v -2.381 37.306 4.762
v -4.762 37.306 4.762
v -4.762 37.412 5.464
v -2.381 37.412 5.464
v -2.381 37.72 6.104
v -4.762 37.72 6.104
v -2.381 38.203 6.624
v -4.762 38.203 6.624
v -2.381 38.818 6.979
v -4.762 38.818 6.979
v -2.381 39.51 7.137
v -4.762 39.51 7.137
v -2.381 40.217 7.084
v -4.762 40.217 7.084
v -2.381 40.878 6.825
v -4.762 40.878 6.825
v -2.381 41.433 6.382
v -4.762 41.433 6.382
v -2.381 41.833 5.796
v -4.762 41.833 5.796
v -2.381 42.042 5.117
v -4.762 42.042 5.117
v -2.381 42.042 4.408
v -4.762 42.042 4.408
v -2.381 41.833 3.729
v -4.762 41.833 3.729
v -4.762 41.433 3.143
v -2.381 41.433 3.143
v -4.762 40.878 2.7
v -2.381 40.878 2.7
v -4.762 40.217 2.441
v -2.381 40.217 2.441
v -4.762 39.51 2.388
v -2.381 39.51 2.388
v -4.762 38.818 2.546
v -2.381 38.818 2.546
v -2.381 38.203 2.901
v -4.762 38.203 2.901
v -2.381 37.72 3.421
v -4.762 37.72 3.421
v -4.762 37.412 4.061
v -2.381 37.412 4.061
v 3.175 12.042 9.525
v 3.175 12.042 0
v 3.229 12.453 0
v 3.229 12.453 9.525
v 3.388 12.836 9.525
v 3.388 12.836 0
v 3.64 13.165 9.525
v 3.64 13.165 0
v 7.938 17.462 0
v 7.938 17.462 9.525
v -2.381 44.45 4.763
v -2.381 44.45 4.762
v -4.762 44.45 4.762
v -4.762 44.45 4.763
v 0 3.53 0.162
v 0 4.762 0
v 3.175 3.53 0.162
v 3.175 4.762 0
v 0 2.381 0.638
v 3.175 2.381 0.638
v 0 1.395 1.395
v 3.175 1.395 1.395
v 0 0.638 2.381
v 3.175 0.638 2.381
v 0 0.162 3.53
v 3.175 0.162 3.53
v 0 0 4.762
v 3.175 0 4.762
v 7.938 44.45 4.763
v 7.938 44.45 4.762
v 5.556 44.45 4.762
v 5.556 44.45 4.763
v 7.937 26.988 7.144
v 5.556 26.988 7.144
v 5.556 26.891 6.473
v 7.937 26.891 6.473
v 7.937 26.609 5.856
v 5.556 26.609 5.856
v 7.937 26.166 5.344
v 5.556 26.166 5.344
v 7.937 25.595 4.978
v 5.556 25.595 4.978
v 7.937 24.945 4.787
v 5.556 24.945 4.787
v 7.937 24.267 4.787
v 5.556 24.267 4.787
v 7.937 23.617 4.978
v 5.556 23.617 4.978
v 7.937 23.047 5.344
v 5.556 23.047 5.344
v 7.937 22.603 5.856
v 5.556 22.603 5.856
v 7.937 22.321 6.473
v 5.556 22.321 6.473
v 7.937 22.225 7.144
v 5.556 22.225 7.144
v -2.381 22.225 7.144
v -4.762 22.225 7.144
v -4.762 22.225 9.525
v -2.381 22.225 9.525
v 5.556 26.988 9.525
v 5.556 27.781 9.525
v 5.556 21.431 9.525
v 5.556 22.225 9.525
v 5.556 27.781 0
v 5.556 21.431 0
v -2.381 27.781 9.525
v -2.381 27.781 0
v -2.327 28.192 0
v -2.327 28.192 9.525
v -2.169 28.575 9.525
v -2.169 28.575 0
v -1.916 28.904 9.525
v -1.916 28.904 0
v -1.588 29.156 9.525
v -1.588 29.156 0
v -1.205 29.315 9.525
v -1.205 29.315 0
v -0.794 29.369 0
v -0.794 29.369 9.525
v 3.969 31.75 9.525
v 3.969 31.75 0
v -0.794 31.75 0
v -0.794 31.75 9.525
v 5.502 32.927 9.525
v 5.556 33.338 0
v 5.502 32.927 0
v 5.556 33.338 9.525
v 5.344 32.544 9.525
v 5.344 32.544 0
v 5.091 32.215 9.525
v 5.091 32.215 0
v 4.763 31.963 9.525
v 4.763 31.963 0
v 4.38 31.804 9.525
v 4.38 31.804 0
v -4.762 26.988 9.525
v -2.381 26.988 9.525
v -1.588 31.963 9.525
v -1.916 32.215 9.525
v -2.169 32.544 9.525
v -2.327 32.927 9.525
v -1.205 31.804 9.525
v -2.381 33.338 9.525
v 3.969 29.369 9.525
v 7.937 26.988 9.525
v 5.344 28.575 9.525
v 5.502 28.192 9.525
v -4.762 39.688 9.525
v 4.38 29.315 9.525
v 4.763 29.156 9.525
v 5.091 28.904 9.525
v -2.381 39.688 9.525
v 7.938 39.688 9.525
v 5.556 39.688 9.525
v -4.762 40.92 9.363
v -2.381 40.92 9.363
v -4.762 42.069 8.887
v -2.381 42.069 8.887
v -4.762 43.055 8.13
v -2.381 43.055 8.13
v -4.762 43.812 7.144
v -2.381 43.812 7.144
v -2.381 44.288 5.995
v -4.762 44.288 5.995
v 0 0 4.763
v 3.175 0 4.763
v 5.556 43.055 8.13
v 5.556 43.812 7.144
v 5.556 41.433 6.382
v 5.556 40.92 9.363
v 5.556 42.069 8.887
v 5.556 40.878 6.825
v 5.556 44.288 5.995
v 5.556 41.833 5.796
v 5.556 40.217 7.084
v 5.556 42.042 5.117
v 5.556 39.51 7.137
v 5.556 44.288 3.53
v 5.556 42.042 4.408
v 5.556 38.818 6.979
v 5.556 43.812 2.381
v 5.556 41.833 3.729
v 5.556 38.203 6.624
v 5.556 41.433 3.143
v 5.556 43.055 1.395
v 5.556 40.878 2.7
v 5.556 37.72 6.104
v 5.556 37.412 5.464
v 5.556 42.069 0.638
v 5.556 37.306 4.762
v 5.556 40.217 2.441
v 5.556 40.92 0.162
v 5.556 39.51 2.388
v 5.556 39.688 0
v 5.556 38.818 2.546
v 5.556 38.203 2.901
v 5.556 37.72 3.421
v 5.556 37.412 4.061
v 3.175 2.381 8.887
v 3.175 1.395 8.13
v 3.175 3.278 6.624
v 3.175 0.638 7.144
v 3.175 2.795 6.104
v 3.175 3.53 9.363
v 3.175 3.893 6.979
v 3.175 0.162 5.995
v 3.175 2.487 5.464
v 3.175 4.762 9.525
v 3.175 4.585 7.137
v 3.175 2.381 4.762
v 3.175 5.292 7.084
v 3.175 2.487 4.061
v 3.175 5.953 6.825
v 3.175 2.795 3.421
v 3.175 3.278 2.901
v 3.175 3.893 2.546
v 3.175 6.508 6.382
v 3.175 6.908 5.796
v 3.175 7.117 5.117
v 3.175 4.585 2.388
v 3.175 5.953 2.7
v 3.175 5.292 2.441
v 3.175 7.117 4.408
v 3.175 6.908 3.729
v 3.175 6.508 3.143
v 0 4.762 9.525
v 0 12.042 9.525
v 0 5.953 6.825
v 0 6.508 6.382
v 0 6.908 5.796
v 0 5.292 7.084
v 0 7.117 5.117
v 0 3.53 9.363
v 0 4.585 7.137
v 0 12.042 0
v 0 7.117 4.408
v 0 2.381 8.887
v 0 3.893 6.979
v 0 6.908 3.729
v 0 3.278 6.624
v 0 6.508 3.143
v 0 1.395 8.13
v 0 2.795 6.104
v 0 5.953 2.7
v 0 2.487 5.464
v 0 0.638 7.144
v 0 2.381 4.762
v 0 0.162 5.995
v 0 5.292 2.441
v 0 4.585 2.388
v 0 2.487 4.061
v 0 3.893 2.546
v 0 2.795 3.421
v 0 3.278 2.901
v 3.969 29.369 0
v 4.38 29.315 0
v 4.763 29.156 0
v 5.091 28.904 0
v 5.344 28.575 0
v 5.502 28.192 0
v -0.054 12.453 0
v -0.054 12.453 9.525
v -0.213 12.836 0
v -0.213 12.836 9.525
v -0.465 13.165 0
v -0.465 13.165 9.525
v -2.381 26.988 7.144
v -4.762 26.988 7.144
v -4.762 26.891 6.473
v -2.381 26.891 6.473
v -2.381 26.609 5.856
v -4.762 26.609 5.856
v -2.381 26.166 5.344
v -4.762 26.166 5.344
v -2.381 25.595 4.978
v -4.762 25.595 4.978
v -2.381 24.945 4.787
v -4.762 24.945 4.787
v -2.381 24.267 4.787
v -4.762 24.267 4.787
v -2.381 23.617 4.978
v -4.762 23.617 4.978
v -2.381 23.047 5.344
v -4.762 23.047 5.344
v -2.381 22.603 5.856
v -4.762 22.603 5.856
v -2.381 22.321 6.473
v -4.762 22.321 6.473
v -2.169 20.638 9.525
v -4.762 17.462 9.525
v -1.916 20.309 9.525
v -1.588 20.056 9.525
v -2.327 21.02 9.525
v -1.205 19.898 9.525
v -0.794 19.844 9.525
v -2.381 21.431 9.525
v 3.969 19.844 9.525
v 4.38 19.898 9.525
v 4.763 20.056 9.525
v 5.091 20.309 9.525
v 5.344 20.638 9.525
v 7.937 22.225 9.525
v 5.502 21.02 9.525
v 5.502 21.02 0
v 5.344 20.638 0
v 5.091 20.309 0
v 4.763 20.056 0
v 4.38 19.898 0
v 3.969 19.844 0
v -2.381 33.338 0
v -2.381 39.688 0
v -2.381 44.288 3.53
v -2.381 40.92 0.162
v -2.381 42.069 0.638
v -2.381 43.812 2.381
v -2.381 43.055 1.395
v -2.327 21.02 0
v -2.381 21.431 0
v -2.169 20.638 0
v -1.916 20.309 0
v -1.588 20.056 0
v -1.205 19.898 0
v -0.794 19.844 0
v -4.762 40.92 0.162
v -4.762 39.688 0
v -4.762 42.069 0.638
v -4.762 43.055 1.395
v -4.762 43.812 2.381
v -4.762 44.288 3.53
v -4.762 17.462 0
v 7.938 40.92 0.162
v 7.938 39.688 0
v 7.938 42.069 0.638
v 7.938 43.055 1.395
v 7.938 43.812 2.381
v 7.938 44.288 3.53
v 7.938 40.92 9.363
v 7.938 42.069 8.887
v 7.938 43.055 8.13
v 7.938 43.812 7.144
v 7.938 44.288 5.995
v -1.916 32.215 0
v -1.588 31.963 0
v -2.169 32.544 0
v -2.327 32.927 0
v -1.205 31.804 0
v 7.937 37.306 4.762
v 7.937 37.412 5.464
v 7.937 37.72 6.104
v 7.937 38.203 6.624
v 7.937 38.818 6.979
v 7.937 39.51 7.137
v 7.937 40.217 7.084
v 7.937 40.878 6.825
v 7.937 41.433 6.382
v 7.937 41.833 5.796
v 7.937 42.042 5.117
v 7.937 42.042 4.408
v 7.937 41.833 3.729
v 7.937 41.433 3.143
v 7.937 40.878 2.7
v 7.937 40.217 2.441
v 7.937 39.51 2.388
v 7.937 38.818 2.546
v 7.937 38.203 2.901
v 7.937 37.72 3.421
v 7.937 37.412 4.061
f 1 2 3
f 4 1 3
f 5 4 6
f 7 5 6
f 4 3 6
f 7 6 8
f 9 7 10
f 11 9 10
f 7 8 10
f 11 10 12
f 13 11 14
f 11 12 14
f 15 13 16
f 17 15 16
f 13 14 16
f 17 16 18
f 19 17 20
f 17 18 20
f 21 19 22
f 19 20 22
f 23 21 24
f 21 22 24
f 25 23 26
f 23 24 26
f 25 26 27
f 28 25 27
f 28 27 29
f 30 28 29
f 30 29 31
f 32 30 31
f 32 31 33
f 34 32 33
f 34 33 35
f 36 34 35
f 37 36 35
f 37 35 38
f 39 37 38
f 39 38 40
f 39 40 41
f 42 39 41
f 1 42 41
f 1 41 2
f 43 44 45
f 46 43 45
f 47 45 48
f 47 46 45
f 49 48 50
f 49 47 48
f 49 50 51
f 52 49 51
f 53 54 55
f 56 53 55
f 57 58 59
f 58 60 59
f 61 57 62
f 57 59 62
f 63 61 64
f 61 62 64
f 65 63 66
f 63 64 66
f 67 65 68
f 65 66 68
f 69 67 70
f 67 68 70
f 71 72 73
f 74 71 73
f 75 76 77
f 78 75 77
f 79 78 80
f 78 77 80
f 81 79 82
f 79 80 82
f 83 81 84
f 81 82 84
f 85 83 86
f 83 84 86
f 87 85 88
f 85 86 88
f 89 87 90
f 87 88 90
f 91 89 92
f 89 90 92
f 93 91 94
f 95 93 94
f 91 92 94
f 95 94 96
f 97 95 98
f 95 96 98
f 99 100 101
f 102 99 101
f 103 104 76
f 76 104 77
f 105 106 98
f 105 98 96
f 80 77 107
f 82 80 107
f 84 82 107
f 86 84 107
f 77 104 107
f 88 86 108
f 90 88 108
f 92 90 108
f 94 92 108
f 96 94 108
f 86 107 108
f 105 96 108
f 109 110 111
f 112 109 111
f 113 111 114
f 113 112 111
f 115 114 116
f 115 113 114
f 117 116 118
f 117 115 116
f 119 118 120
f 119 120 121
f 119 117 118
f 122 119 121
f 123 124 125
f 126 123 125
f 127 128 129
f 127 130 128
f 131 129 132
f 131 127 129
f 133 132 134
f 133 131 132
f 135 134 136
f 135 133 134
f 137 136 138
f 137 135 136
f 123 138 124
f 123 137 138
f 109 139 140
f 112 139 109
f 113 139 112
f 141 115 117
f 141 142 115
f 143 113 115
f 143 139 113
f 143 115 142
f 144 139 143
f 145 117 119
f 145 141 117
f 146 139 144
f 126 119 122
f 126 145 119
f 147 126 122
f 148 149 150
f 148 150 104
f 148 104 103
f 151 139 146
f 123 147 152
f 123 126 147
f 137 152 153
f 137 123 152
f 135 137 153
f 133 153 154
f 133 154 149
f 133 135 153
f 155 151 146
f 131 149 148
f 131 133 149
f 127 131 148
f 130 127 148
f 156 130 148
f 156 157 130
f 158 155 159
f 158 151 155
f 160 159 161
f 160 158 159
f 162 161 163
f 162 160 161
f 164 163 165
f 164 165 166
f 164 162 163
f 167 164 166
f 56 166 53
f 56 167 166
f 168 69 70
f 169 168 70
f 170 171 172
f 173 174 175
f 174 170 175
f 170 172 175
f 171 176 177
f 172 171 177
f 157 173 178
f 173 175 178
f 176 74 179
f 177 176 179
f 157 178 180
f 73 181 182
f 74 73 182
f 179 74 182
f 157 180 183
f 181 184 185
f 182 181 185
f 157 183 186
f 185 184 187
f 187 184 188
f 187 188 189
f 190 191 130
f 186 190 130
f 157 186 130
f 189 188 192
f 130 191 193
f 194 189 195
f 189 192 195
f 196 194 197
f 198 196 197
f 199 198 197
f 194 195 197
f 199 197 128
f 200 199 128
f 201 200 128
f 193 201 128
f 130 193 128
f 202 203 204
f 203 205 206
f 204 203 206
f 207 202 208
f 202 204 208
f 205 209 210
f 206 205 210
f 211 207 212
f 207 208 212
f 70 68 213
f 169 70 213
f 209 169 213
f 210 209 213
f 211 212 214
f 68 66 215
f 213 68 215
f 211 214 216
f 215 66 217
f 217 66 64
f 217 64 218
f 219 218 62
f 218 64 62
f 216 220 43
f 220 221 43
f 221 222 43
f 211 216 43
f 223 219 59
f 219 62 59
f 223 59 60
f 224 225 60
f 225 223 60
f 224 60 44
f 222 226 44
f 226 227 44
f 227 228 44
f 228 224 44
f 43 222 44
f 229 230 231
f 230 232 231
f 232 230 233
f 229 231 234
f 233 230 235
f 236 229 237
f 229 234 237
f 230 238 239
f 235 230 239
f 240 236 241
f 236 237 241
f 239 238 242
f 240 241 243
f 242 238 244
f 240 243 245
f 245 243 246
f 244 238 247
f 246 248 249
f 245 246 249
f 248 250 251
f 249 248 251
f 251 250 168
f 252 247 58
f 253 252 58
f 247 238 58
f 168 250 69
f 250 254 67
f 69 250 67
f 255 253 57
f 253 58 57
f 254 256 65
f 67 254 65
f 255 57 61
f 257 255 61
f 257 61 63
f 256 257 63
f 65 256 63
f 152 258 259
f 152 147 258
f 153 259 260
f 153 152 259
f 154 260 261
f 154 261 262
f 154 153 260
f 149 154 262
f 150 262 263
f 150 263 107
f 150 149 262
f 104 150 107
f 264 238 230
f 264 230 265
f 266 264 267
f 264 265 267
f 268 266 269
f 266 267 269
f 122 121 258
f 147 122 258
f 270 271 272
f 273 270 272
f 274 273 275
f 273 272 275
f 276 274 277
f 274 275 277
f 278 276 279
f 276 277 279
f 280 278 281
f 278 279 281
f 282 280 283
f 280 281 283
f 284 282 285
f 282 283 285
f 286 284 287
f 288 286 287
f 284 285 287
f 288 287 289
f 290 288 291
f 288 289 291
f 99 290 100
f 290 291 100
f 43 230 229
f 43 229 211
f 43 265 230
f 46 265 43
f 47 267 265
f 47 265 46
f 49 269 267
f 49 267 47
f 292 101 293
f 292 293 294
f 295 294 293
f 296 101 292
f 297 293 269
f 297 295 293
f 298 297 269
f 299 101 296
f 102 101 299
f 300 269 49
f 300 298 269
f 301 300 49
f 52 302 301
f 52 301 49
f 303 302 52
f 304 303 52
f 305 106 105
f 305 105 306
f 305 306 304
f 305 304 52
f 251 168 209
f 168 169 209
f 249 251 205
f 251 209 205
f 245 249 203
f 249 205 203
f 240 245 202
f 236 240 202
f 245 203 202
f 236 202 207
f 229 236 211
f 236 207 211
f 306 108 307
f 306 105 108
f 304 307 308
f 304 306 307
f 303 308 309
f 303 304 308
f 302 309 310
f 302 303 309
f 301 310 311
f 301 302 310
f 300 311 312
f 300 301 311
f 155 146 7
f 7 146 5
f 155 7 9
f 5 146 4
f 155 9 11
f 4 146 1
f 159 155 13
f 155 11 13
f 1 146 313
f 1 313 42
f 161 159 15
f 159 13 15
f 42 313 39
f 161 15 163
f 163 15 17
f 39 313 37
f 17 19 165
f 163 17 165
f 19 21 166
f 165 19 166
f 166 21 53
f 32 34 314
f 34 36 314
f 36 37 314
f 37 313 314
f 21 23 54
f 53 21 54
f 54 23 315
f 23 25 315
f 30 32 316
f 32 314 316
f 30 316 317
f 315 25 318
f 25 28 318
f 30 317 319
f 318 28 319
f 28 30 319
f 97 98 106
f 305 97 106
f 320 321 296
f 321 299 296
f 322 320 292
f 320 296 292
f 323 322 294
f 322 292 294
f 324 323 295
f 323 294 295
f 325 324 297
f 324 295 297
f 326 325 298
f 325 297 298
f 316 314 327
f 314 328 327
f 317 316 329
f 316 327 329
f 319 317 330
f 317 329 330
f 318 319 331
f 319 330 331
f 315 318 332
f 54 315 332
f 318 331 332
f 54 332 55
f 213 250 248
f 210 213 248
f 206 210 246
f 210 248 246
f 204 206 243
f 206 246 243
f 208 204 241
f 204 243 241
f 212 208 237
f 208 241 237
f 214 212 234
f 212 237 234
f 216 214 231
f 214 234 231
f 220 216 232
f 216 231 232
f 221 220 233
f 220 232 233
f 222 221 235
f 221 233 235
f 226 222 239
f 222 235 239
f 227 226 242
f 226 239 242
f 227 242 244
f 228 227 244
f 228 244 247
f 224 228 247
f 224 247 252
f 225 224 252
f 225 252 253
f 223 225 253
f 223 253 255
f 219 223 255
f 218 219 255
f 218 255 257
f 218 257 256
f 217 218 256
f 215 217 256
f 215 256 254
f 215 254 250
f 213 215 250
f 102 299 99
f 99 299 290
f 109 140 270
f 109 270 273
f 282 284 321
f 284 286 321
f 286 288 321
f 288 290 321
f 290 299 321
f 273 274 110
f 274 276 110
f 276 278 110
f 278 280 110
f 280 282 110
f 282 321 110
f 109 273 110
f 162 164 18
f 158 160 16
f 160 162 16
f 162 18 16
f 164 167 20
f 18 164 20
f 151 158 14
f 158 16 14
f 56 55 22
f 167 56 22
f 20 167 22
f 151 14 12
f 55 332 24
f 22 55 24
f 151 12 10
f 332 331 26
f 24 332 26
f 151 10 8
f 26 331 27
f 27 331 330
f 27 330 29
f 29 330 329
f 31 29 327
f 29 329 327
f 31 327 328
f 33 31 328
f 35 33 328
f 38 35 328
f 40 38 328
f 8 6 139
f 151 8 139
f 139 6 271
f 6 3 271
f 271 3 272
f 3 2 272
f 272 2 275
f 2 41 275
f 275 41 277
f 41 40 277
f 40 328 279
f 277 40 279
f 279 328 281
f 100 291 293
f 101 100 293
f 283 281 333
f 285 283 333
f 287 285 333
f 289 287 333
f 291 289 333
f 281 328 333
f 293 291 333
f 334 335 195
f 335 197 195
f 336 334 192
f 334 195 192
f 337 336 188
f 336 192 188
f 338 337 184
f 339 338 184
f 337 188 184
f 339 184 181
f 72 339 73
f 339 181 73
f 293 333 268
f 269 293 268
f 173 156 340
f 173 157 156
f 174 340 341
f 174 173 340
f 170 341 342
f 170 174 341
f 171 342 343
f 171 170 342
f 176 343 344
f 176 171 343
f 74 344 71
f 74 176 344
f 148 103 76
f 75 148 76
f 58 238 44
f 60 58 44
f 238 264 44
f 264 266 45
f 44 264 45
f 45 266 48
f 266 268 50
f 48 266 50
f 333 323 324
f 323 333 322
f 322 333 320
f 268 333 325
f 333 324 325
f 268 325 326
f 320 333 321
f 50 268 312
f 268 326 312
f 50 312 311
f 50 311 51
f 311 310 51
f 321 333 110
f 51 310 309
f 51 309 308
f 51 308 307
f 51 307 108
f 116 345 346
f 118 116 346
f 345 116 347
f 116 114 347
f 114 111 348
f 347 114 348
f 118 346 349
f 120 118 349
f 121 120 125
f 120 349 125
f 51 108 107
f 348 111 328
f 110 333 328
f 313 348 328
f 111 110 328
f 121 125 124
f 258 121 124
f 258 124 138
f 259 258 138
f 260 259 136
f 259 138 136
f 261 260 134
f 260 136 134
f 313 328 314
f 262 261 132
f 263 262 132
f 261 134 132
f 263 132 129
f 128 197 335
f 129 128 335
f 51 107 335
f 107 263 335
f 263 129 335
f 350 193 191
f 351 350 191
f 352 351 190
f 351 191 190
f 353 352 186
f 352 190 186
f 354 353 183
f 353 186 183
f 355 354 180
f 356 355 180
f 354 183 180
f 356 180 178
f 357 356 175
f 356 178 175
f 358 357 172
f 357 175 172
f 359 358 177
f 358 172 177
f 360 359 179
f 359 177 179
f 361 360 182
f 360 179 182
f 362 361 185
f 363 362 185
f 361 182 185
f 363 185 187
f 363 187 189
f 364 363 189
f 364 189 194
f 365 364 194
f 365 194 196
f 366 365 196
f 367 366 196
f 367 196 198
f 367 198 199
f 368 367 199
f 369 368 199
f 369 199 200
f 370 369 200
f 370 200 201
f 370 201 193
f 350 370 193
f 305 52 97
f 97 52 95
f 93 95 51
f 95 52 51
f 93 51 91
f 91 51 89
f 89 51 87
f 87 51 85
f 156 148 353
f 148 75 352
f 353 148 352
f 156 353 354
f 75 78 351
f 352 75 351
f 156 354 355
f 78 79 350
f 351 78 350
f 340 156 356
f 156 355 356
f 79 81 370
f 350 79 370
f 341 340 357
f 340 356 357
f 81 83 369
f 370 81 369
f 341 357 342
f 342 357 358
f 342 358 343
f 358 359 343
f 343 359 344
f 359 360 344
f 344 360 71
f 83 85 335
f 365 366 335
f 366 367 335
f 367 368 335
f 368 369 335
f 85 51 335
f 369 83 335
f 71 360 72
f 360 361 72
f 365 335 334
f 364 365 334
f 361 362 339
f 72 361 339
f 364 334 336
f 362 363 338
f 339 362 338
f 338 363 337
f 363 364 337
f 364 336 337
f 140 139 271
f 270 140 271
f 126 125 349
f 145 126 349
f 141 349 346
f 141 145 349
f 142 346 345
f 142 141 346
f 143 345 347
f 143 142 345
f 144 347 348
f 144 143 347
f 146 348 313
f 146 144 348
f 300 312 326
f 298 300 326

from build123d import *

# Parameters (mm, degrees)
F1_DEPTH = 9.525
F2_R     = 1.5875
F3_R     = 4.76249
F4_R     = 2.38125
F5_DEPTH = 12.7


# Not quite as in the source:
# - a fillet or chamfer is up to 0.001 mm smaller than in the source, because OpenCascade refuses the exact size


with BuildPart() as f1:
    # F0 (on Top) → F1 (new body)
    with BuildSketch(Plane.XY):
        Polygon((0, 12.7), (0, 0), (3.175, 0), (3.175, 12.7), (7.9375, 17.4625), (7.9375, 44.45), (5.55625, 44.45), (5.55625, 31.75), (1.5875, 31.75), (-2.38125, 31.75), (-2.38125, 44.45), (-4.7625, 44.45), (-4.7625, 17.4625), align=None)
        Polygon((-2.38125, 29.36875), (1.5875, 29.36875), (5.55625, 29.36875), (5.55625, 19.84375), (-2.38125, 19.84375), align=None, mode=Mode.SUBTRACT)
    extrude(amount=F1_DEPTH)

    # F2
    f2_edges = [f1.edges().sort_by_distance(p)[0] for p in [
        (-2.38125, 31.75, 4.7625),
        (5.55625, 31.75, 4.7625),
        (5.55625, 29.36875, 4.7625),
        (-2.38125, 29.36875, 4.7625),
        (-2.38125, 19.84375, 4.7625),
        (5.55625, 19.84375, 4.7625),
        (0, 12.7, 4.7625),
        (3.175, 12.7, 4.7625),
    ]]
    fillet(f2_edges, radius=F2_R)

    # F3 (radius 4.7625 in the source; OpenCascade refuses exactly that, so slightly less here)
    f3_edges = [f1.edges().sort_by_distance(p)[0] for p in [
        (1.5875, 0, 9.525),
        (1.5875, 0, 0),
        (-3.571875, 44.45, 9.525),
        (-3.571875, 44.45, 0),
        (6.746875, 44.45, 9.525),
        (6.746875, 44.45, 0),
    ]]
    fillet(f3_edges, radius=F3_R)

    # F4 (on face) → F5 (cut, through all)
    with BuildSketch(Plane(origin=(-4.7625, 0, 0), x_dir=(0, -1, 0), z_dir=(-1, 0, 0))):
        with Locations((-39.6875, 4.7625)):
            Circle(F4_R)
        with Locations((-4.7625, 4.7625)):
            Circle(F4_R)
        with BuildLine():
            Line((-22.225, 9.525), (-26.9875, 9.525))
            Line((-26.9875, 9.525), (-26.9875, 7.14375))
            ThreePointArc((-26.9875, 7.14375), (-24.60625, 4.7625), (-22.225, 7.14375))
            Line((-22.225, 7.14375), (-22.225, 9.525))
        make_face()
    extrude(amount=-F5_DEPTH, mode=Mode.SUBTRACT)


solid = f1.part
